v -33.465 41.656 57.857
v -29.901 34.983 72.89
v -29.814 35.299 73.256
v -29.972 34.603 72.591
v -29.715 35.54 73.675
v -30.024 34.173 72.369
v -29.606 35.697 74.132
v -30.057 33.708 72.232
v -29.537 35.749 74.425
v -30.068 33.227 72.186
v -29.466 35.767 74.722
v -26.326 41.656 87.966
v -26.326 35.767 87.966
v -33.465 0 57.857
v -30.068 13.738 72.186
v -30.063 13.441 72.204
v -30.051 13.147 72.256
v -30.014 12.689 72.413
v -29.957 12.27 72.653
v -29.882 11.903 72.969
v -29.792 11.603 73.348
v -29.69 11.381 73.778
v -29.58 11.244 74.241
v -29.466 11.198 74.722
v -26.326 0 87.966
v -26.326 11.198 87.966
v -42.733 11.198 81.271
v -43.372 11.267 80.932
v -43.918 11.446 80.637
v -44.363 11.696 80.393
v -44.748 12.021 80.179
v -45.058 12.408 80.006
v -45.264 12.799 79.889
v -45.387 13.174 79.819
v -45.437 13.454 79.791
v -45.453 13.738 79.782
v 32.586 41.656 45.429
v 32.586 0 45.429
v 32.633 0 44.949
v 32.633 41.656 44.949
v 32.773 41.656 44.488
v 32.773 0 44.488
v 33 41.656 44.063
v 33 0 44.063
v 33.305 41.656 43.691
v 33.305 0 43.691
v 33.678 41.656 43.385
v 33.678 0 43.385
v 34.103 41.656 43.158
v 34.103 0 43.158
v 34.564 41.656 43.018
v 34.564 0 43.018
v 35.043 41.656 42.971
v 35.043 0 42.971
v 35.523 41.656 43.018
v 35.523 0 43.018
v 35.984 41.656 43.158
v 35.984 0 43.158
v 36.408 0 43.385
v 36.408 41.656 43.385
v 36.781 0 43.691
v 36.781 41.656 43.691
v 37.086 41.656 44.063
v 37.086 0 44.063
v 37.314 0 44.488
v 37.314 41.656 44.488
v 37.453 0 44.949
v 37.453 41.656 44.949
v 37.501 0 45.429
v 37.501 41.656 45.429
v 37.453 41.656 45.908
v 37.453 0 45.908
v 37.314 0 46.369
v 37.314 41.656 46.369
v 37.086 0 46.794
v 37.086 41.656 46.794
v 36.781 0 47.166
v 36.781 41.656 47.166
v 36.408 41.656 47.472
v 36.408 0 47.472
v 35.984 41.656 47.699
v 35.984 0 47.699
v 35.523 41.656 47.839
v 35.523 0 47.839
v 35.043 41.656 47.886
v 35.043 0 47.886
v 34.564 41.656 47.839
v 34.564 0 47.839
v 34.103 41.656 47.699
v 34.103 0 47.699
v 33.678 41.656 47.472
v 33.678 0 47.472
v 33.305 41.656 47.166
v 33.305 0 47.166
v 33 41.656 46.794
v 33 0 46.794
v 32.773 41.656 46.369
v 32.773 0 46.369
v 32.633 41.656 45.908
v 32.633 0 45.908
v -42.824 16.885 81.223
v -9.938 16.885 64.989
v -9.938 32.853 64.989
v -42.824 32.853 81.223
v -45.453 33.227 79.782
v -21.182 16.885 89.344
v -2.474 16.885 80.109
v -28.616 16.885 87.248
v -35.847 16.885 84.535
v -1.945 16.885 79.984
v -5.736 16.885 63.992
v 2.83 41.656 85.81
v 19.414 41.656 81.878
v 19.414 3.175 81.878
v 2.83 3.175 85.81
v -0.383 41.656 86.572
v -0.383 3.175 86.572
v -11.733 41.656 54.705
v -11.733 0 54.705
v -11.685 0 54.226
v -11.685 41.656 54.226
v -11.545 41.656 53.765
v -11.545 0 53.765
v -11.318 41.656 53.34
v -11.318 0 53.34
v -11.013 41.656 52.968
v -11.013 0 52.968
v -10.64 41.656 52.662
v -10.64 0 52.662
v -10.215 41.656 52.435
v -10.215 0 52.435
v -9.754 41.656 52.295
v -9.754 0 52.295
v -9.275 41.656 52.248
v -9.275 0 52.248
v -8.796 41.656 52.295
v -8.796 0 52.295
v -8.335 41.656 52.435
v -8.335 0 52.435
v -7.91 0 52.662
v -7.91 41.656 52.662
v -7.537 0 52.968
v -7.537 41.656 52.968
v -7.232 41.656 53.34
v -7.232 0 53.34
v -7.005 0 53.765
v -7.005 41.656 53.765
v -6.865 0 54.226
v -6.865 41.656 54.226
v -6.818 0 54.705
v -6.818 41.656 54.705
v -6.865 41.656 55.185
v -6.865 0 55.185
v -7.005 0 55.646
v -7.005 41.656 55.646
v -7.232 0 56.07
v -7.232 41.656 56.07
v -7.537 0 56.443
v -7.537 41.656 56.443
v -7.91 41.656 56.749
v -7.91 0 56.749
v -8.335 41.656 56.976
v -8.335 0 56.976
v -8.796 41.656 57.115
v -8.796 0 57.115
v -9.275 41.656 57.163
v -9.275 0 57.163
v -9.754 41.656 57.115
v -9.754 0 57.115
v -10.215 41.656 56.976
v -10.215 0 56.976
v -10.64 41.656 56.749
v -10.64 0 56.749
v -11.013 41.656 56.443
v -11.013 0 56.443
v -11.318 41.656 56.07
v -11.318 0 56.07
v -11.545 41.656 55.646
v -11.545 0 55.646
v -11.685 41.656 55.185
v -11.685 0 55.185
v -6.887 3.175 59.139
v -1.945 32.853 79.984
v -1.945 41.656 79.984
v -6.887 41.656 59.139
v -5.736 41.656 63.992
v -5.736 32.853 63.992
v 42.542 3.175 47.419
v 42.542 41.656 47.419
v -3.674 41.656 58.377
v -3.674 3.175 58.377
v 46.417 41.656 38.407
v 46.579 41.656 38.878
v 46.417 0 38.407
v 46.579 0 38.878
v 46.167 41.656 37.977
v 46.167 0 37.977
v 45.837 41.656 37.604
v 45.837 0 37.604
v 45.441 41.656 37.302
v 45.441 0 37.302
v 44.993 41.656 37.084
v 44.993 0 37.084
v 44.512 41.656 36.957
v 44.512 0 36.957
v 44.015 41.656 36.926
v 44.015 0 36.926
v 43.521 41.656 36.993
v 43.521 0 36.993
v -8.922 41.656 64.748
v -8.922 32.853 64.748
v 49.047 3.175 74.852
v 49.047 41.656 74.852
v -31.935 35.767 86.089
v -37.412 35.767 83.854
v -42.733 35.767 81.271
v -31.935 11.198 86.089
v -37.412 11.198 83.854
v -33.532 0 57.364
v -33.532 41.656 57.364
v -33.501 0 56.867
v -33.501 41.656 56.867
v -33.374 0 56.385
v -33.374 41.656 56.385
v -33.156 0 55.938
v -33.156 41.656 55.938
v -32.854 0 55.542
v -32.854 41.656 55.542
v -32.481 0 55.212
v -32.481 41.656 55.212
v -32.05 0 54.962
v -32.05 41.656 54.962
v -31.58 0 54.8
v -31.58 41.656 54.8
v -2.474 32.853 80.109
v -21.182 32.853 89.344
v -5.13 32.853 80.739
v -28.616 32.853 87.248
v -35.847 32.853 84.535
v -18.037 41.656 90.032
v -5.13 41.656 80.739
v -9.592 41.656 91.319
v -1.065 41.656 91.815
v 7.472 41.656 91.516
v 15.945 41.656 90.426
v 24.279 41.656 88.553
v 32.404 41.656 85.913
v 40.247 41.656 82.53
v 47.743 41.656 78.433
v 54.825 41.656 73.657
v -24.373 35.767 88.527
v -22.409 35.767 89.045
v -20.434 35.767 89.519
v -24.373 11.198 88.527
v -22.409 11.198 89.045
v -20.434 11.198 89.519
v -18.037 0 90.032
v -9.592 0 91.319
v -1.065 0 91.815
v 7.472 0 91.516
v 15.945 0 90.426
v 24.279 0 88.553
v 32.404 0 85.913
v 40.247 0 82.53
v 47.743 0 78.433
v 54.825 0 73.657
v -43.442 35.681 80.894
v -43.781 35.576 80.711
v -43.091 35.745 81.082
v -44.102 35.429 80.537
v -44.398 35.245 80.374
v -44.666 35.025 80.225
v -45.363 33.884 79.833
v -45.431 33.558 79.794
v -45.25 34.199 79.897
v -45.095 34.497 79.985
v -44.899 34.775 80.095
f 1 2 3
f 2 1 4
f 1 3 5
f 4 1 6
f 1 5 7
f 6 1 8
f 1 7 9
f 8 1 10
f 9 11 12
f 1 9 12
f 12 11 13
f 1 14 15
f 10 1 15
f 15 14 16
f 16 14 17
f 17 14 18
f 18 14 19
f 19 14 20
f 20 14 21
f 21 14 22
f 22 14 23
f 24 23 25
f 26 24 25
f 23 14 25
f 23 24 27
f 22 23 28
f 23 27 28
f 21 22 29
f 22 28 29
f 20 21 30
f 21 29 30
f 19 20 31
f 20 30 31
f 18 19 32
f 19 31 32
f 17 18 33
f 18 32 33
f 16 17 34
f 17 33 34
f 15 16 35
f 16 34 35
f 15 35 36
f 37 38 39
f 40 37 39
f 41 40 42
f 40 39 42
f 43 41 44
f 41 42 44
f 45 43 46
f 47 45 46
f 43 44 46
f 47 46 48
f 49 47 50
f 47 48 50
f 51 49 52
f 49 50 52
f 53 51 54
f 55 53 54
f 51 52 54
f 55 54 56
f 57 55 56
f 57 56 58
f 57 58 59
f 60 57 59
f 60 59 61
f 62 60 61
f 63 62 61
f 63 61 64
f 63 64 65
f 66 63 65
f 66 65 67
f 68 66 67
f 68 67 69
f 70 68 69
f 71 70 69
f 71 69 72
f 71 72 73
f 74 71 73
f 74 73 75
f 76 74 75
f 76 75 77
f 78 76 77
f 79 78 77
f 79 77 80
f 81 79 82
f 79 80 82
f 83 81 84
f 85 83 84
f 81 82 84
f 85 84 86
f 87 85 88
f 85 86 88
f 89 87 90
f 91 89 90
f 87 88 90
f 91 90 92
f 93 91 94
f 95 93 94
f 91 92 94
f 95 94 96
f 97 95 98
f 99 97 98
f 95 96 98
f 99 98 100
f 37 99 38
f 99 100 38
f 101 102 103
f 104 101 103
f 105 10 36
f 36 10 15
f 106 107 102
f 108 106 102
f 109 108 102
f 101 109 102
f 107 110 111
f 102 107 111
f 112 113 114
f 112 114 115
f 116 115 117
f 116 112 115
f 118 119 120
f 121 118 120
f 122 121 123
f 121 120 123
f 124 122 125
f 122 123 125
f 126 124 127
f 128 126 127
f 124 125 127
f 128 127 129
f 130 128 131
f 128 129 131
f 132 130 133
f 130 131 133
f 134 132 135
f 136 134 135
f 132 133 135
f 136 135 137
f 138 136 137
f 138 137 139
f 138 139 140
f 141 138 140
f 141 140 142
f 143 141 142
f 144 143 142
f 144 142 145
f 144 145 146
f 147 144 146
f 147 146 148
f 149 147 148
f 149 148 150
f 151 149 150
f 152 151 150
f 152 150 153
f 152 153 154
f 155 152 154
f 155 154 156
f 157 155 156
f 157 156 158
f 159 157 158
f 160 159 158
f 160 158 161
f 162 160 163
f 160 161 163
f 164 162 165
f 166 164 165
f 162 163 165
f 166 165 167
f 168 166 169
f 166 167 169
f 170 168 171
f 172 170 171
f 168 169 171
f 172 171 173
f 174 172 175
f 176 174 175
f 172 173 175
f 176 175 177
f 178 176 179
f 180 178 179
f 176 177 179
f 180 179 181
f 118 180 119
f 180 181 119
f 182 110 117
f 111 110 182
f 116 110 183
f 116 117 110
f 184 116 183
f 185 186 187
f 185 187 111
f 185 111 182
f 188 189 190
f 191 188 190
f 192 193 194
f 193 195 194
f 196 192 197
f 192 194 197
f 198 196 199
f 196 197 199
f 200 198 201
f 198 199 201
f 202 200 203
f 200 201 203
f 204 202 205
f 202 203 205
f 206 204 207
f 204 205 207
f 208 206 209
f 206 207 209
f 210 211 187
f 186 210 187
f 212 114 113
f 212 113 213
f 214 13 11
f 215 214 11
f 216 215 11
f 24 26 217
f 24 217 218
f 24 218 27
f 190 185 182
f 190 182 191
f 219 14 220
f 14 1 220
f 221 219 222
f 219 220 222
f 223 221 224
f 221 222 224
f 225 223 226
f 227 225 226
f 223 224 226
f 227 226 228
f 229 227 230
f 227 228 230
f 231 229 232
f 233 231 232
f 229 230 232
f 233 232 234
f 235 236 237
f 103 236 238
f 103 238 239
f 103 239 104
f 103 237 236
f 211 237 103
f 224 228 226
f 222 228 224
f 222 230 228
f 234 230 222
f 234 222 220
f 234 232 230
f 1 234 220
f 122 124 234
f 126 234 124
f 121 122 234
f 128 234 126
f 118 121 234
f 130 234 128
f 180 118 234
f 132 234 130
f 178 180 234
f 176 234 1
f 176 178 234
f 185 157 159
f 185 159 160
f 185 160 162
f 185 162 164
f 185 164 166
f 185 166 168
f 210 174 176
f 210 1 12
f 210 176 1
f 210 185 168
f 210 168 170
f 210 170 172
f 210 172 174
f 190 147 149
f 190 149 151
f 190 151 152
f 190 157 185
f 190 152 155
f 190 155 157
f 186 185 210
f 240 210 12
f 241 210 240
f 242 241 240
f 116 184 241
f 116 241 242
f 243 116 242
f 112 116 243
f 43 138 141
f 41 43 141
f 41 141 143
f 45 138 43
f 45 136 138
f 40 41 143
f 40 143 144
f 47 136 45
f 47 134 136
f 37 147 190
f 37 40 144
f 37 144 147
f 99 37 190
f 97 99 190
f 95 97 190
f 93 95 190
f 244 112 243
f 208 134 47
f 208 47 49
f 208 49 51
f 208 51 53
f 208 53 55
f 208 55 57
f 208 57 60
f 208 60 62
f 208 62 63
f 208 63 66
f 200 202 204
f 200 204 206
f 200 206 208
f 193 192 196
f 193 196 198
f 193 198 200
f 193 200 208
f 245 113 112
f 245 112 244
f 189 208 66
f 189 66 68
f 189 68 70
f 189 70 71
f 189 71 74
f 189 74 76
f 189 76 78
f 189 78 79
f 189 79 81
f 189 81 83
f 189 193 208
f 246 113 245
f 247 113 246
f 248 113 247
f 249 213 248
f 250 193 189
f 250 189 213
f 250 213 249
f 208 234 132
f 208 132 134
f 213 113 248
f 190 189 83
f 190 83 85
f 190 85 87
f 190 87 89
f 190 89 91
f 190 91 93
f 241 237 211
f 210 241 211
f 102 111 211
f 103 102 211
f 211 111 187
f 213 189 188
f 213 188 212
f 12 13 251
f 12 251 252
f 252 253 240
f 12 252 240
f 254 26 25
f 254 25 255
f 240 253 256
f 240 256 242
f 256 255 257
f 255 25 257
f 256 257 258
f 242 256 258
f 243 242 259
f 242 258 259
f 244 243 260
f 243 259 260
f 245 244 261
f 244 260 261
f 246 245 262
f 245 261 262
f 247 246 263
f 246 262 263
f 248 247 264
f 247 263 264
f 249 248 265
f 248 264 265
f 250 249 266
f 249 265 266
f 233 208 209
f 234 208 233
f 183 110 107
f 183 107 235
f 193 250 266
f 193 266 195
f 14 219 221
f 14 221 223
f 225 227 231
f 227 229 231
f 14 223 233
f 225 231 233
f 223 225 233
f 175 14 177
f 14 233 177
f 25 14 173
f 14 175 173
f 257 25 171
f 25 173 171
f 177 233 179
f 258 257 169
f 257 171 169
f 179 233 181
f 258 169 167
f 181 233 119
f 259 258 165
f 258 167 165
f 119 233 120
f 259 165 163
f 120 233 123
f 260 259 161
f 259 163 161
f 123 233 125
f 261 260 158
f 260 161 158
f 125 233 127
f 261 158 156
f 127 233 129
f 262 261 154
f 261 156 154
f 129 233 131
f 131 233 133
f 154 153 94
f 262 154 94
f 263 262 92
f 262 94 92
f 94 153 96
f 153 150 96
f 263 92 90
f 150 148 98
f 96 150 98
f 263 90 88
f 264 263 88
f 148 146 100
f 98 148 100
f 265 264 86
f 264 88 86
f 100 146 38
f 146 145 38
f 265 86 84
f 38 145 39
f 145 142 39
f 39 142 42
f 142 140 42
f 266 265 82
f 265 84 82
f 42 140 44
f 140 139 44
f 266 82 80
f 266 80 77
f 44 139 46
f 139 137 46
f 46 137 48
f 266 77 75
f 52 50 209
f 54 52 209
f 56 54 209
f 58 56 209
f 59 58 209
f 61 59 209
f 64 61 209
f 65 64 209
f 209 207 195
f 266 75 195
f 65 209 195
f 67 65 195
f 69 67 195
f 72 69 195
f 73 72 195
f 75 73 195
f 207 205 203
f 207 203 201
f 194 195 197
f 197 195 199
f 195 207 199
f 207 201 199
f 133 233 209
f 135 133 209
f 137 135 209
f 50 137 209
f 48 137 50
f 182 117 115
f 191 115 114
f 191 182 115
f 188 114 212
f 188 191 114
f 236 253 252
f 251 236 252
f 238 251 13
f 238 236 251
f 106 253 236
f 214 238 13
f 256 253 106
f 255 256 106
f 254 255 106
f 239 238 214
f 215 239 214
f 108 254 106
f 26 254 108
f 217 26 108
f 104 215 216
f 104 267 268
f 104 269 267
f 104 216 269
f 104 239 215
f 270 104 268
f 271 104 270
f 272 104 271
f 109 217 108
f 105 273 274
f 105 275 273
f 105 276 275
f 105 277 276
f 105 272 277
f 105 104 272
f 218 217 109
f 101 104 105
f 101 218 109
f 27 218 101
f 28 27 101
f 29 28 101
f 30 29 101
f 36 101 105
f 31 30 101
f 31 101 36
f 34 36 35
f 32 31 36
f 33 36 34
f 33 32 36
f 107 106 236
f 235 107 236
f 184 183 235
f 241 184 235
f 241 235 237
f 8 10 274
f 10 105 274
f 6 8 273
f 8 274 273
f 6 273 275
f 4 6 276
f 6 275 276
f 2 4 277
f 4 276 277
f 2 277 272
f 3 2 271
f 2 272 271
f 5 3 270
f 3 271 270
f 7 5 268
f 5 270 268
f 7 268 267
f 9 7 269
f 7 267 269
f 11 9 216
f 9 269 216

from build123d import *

# Parameters (mm, degrees)
BOSS_EXTRUDE1_DEPTH          = 41.656
CUT_EXTRUDE1_DEPTH           = 38.481
CUT_EXTRUDE2_START           = -28.8671
SKETCH11_W                   = 16.434556017
SKETCH11_H                   = 15.968225366
CUT_EXTRUDE2_DEPTH           = 7.62
SKETCH16_W                   = 24.568216569
SKETCH16_H                   = 19.806256701
BOSS_EXTRUDE3_DEPTH          = 53.34
CUT_EXTRUDE3_START           = -24.568216569
CUT_EXTRUDE3_DEPTH           = 24.568216569
SKETCH22_W                   = 16.862412739
SKETCH22_H                   = 15.968225366
CUT_EXTRUDE4_DEPTH           = 53.34
CUT_EXTRUDE6_DEPTH           = 119.901499034
F_10_0_1935_DIAMETER_HOLE1_D = 4.9149
CUT_EXTRUDE11_REACH          = 116.77
CUT_EXTRUDE9_DEPTH           = 112.875933154
FILLET2_R                    = 2.54
SKETCH34_W                   = 28.194
SKETCH34_H                   = 38.481
BOSS_EXTRUDE4_DEPTH          = 3.302


# Read off the part's stored shape, not the designer's step: Cut-Extrude3
with BuildPart() as part:
    # Sketch1 → Boss-Extrude1 (new body)
    with BuildSketch(Plane(origin=(0, 0, 0), x_dir=(1, 0, 0), z_dir=(0, 1, 0))):
        with BuildLine():
            Line((63.017839503, -66.782093), (53.468205472, -26.506342671))
            Line((53.468205472, -26.506342671), (-35.875703335, -47.690346072))
            Line((-35.875703335, -47.690346072), (-26.326069304, -87.966096401))
            ThreePointArc((-26.326069304, -87.966096401), (21.184003401, -89.343908807), (63.017839503, -66.782093))
        make_face()
    extrude(amount=BOSS_EXTRUDE1_DEPTH)

    # Sketch2 → Cut-Extrude1 (cut)
    with BuildSketch(Plane(origin=(0, 41.656, 0), x_dir=(1, 0, 0), z_dir=(0, 1, 0))):
        Polygon((19.413866358, -81.878324539), (52.259801297, -74.090346526), (45.755169548, -46.656947141), (-3.674378893, -58.377004348), (2.830252857, -85.810403732), align=None)
    extrude(amount=-CUT_EXTRUDE1_DEPTH, mode=Mode.SUBTRACT)

    # Sketch11 → Cut-Extrude2 (cut)
    with BuildSketch(Plane(origin=(-44.671954403, 0, 10.592001701), x_dir=(0.230709787533386, 0, 0.973022607104429), z_dir=(-0.973022607104429, 0, 0.230709787533386)).offset(CUT_EXTRUDE2_START)):
        with Locations((69.159923537, 24.869161711)):
            Rectangle(SKETCH11_W, SKETCH11_H)
    extrude(amount=CUT_EXTRUDE2_DEPTH, mode=Mode.SUBTRACT)

    # Sketch16 → Boss-Extrude3 (add)
    with BuildSketch(Plane(origin=(-33.786311583, 0, 16.678693854), x_dir=(0, -1, 0), z_dir=(0.8966923373350206, 0, -0.4426543258171746))):
        with Locations((-23.482416275, -61.32247831)):
            Rectangle(SKETCH16_W, SKETCH16_H)
    extrude(amount=-BOSS_EXTRUDE3_DEPTH)

    # Cut-Extrude3 outline → Cut-Extrude3 (cut)
    with BuildSketch(Plane(origin=(0, 35.766524559, 0), x_dir=(1, 0, 0), z_dir=(0, 1, 0)).offset(CUT_EXTRUDE3_START)):
        with BuildLine():
            Line((-50.087557959, -104.157331307), (-20.43350094, -89.518534843))
            ThreePointArc((-20.43350094, -89.518534843), (-33.301223909, -85.569413503), (-45.453344654, -79.781511021))
            Line((-45.453344654, -79.781511021), (-58.854883166, -86.397212692))
            Line((-58.854883166, -86.397212692), (-50.087557959, -104.157331307))
        make_face()
    extrude(amount=CUT_EXTRUDE3_DEPTH, mode=Mode.SUBTRACT)

    # Sketch22 → Cut-Extrude4 (cut)
    with BuildSketch(Plane(origin=(-33.786311583, 0, 16.678693854), x_dir=(-0.4426543258171747, 0, -0.8966923373350206), z_dir=(0.8966923373350207, 0, -0.44265432581717473))):
        with Locations((-62.30694919, 24.869161711)):
            Rectangle(SKETCH22_W, SKETCH22_H)
    extrude(amount=-CUT_EXTRUDE4_DEPTH, mode=Mode.SUBTRACT)

    # Sketch24 → Cut-Extrude6 (cut, through all)
    with BuildSketch(Plane(origin=(0, 41.656, 0), x_dir=(1, 0, 0), z_dir=(0, 1, 0))):
        Polygon((56.919592876, -82.490265238), (45.99293133, -36.406877021), (-47.298720085, -58.526915055), (-50.529685657, -44.900260642), (55.061086644, -19.864023596), (69.218713762, -79.574066225), align=None)
    extrude(amount=-CUT_EXTRUDE6_DEPTH, mode=Mode.SUBTRACT)

    # #10 (0.1935) Diameter Hole1 (through all)
    with Locations(Plane(origin=(0, 41.656, 0), x_dir=(1, 0, 0), z_dir=(0, 1, 0))):
        with Locations((-9.275051774, -54.705205641), (35.043117703, -45.428524284)):
            Hole(F_10_0_1935_DIAMETER_HOLE1_D / 2)

    # Cut-Extrude11: up to this face of the body (flat: up to its plane)
    cut_extrude11_end = Plane(part.part.faces().sort_by_distance((24.292711202, 3.175, 66.233675437))[0])
    # Sketch33 → Cut-Extrude11 (cut, up to the picked face)
    with BuildSketch(Plane(origin=(0, 41.656, 0), x_dir=(1, 0, 0), z_dir=(0, 1, 0)), mode=Mode.PRIVATE) as cut_extrude11_sk1:
        Polygon((-6.887299542, -59.138808066), (13.024531054, -54.417587641), (19.529162804, -81.850987026), (-0.382667792, -86.572207451), align=None)
    cut_extrude11_tool1 = split(extrude(cut_extrude11_sk1.sketch, amount=-CUT_EXTRUDE11_REACH, mode=Mode.PRIVATE), bisect_by=cut_extrude11_end, keep=Keep.BOTH, mode=Mode.PRIVATE)
    add(cut_extrude11_tool1.solids().sort_by(Axis((6.320932, 41.656, 70.494898), (0, -1, 0)))[0], mode=Mode.SUBTRACT)

    # Sketch30 → Cut-Extrude9 (cut, through all)
    with BuildSketch(Plane.XZ.offset(-32.853274394)):
        Polygon((-5.736469349, 63.992454746), (-1.944856422, 79.983649289), (-5.130071965, 80.738883952), (-8.921684892, 64.74768941), align=None)
    extrude(amount=-CUT_EXTRUDE9_DEPTH, mode=Mode.SUBTRACT)

    # Fillet2
    fillet2_edges = [part.edges().sort_by_distance(p)[0] for p in [
        (-34.051060037, 20.828, 55.385811433),
        (45.99293133, 20.828, 36.406877021),
        (-37.760453577, 11.19830799, 75.983896866),
        (-37.760453577, 35.766524559, 75.983896866),
    ]]
    fillet(fillet2_edges, radius=FILLET2_R)

    # Sketch34 → Boss-Extrude4 (add)
    with BuildSketch(Plane(origin=(32.845934939, 0, -7.787978014), x_dir=(0.23070978753338592, 0, 0.973022607104429), z_dir=(-0.9730226071044291, 0, 0.23070978753338595))):
        with Locations((70.051429791, 22.4155)):
            Rectangle(SKETCH34_W, SKETCH34_H)
    extrude(amount=BOSS_EXTRUDE4_DEPTH)


solid = part.part
